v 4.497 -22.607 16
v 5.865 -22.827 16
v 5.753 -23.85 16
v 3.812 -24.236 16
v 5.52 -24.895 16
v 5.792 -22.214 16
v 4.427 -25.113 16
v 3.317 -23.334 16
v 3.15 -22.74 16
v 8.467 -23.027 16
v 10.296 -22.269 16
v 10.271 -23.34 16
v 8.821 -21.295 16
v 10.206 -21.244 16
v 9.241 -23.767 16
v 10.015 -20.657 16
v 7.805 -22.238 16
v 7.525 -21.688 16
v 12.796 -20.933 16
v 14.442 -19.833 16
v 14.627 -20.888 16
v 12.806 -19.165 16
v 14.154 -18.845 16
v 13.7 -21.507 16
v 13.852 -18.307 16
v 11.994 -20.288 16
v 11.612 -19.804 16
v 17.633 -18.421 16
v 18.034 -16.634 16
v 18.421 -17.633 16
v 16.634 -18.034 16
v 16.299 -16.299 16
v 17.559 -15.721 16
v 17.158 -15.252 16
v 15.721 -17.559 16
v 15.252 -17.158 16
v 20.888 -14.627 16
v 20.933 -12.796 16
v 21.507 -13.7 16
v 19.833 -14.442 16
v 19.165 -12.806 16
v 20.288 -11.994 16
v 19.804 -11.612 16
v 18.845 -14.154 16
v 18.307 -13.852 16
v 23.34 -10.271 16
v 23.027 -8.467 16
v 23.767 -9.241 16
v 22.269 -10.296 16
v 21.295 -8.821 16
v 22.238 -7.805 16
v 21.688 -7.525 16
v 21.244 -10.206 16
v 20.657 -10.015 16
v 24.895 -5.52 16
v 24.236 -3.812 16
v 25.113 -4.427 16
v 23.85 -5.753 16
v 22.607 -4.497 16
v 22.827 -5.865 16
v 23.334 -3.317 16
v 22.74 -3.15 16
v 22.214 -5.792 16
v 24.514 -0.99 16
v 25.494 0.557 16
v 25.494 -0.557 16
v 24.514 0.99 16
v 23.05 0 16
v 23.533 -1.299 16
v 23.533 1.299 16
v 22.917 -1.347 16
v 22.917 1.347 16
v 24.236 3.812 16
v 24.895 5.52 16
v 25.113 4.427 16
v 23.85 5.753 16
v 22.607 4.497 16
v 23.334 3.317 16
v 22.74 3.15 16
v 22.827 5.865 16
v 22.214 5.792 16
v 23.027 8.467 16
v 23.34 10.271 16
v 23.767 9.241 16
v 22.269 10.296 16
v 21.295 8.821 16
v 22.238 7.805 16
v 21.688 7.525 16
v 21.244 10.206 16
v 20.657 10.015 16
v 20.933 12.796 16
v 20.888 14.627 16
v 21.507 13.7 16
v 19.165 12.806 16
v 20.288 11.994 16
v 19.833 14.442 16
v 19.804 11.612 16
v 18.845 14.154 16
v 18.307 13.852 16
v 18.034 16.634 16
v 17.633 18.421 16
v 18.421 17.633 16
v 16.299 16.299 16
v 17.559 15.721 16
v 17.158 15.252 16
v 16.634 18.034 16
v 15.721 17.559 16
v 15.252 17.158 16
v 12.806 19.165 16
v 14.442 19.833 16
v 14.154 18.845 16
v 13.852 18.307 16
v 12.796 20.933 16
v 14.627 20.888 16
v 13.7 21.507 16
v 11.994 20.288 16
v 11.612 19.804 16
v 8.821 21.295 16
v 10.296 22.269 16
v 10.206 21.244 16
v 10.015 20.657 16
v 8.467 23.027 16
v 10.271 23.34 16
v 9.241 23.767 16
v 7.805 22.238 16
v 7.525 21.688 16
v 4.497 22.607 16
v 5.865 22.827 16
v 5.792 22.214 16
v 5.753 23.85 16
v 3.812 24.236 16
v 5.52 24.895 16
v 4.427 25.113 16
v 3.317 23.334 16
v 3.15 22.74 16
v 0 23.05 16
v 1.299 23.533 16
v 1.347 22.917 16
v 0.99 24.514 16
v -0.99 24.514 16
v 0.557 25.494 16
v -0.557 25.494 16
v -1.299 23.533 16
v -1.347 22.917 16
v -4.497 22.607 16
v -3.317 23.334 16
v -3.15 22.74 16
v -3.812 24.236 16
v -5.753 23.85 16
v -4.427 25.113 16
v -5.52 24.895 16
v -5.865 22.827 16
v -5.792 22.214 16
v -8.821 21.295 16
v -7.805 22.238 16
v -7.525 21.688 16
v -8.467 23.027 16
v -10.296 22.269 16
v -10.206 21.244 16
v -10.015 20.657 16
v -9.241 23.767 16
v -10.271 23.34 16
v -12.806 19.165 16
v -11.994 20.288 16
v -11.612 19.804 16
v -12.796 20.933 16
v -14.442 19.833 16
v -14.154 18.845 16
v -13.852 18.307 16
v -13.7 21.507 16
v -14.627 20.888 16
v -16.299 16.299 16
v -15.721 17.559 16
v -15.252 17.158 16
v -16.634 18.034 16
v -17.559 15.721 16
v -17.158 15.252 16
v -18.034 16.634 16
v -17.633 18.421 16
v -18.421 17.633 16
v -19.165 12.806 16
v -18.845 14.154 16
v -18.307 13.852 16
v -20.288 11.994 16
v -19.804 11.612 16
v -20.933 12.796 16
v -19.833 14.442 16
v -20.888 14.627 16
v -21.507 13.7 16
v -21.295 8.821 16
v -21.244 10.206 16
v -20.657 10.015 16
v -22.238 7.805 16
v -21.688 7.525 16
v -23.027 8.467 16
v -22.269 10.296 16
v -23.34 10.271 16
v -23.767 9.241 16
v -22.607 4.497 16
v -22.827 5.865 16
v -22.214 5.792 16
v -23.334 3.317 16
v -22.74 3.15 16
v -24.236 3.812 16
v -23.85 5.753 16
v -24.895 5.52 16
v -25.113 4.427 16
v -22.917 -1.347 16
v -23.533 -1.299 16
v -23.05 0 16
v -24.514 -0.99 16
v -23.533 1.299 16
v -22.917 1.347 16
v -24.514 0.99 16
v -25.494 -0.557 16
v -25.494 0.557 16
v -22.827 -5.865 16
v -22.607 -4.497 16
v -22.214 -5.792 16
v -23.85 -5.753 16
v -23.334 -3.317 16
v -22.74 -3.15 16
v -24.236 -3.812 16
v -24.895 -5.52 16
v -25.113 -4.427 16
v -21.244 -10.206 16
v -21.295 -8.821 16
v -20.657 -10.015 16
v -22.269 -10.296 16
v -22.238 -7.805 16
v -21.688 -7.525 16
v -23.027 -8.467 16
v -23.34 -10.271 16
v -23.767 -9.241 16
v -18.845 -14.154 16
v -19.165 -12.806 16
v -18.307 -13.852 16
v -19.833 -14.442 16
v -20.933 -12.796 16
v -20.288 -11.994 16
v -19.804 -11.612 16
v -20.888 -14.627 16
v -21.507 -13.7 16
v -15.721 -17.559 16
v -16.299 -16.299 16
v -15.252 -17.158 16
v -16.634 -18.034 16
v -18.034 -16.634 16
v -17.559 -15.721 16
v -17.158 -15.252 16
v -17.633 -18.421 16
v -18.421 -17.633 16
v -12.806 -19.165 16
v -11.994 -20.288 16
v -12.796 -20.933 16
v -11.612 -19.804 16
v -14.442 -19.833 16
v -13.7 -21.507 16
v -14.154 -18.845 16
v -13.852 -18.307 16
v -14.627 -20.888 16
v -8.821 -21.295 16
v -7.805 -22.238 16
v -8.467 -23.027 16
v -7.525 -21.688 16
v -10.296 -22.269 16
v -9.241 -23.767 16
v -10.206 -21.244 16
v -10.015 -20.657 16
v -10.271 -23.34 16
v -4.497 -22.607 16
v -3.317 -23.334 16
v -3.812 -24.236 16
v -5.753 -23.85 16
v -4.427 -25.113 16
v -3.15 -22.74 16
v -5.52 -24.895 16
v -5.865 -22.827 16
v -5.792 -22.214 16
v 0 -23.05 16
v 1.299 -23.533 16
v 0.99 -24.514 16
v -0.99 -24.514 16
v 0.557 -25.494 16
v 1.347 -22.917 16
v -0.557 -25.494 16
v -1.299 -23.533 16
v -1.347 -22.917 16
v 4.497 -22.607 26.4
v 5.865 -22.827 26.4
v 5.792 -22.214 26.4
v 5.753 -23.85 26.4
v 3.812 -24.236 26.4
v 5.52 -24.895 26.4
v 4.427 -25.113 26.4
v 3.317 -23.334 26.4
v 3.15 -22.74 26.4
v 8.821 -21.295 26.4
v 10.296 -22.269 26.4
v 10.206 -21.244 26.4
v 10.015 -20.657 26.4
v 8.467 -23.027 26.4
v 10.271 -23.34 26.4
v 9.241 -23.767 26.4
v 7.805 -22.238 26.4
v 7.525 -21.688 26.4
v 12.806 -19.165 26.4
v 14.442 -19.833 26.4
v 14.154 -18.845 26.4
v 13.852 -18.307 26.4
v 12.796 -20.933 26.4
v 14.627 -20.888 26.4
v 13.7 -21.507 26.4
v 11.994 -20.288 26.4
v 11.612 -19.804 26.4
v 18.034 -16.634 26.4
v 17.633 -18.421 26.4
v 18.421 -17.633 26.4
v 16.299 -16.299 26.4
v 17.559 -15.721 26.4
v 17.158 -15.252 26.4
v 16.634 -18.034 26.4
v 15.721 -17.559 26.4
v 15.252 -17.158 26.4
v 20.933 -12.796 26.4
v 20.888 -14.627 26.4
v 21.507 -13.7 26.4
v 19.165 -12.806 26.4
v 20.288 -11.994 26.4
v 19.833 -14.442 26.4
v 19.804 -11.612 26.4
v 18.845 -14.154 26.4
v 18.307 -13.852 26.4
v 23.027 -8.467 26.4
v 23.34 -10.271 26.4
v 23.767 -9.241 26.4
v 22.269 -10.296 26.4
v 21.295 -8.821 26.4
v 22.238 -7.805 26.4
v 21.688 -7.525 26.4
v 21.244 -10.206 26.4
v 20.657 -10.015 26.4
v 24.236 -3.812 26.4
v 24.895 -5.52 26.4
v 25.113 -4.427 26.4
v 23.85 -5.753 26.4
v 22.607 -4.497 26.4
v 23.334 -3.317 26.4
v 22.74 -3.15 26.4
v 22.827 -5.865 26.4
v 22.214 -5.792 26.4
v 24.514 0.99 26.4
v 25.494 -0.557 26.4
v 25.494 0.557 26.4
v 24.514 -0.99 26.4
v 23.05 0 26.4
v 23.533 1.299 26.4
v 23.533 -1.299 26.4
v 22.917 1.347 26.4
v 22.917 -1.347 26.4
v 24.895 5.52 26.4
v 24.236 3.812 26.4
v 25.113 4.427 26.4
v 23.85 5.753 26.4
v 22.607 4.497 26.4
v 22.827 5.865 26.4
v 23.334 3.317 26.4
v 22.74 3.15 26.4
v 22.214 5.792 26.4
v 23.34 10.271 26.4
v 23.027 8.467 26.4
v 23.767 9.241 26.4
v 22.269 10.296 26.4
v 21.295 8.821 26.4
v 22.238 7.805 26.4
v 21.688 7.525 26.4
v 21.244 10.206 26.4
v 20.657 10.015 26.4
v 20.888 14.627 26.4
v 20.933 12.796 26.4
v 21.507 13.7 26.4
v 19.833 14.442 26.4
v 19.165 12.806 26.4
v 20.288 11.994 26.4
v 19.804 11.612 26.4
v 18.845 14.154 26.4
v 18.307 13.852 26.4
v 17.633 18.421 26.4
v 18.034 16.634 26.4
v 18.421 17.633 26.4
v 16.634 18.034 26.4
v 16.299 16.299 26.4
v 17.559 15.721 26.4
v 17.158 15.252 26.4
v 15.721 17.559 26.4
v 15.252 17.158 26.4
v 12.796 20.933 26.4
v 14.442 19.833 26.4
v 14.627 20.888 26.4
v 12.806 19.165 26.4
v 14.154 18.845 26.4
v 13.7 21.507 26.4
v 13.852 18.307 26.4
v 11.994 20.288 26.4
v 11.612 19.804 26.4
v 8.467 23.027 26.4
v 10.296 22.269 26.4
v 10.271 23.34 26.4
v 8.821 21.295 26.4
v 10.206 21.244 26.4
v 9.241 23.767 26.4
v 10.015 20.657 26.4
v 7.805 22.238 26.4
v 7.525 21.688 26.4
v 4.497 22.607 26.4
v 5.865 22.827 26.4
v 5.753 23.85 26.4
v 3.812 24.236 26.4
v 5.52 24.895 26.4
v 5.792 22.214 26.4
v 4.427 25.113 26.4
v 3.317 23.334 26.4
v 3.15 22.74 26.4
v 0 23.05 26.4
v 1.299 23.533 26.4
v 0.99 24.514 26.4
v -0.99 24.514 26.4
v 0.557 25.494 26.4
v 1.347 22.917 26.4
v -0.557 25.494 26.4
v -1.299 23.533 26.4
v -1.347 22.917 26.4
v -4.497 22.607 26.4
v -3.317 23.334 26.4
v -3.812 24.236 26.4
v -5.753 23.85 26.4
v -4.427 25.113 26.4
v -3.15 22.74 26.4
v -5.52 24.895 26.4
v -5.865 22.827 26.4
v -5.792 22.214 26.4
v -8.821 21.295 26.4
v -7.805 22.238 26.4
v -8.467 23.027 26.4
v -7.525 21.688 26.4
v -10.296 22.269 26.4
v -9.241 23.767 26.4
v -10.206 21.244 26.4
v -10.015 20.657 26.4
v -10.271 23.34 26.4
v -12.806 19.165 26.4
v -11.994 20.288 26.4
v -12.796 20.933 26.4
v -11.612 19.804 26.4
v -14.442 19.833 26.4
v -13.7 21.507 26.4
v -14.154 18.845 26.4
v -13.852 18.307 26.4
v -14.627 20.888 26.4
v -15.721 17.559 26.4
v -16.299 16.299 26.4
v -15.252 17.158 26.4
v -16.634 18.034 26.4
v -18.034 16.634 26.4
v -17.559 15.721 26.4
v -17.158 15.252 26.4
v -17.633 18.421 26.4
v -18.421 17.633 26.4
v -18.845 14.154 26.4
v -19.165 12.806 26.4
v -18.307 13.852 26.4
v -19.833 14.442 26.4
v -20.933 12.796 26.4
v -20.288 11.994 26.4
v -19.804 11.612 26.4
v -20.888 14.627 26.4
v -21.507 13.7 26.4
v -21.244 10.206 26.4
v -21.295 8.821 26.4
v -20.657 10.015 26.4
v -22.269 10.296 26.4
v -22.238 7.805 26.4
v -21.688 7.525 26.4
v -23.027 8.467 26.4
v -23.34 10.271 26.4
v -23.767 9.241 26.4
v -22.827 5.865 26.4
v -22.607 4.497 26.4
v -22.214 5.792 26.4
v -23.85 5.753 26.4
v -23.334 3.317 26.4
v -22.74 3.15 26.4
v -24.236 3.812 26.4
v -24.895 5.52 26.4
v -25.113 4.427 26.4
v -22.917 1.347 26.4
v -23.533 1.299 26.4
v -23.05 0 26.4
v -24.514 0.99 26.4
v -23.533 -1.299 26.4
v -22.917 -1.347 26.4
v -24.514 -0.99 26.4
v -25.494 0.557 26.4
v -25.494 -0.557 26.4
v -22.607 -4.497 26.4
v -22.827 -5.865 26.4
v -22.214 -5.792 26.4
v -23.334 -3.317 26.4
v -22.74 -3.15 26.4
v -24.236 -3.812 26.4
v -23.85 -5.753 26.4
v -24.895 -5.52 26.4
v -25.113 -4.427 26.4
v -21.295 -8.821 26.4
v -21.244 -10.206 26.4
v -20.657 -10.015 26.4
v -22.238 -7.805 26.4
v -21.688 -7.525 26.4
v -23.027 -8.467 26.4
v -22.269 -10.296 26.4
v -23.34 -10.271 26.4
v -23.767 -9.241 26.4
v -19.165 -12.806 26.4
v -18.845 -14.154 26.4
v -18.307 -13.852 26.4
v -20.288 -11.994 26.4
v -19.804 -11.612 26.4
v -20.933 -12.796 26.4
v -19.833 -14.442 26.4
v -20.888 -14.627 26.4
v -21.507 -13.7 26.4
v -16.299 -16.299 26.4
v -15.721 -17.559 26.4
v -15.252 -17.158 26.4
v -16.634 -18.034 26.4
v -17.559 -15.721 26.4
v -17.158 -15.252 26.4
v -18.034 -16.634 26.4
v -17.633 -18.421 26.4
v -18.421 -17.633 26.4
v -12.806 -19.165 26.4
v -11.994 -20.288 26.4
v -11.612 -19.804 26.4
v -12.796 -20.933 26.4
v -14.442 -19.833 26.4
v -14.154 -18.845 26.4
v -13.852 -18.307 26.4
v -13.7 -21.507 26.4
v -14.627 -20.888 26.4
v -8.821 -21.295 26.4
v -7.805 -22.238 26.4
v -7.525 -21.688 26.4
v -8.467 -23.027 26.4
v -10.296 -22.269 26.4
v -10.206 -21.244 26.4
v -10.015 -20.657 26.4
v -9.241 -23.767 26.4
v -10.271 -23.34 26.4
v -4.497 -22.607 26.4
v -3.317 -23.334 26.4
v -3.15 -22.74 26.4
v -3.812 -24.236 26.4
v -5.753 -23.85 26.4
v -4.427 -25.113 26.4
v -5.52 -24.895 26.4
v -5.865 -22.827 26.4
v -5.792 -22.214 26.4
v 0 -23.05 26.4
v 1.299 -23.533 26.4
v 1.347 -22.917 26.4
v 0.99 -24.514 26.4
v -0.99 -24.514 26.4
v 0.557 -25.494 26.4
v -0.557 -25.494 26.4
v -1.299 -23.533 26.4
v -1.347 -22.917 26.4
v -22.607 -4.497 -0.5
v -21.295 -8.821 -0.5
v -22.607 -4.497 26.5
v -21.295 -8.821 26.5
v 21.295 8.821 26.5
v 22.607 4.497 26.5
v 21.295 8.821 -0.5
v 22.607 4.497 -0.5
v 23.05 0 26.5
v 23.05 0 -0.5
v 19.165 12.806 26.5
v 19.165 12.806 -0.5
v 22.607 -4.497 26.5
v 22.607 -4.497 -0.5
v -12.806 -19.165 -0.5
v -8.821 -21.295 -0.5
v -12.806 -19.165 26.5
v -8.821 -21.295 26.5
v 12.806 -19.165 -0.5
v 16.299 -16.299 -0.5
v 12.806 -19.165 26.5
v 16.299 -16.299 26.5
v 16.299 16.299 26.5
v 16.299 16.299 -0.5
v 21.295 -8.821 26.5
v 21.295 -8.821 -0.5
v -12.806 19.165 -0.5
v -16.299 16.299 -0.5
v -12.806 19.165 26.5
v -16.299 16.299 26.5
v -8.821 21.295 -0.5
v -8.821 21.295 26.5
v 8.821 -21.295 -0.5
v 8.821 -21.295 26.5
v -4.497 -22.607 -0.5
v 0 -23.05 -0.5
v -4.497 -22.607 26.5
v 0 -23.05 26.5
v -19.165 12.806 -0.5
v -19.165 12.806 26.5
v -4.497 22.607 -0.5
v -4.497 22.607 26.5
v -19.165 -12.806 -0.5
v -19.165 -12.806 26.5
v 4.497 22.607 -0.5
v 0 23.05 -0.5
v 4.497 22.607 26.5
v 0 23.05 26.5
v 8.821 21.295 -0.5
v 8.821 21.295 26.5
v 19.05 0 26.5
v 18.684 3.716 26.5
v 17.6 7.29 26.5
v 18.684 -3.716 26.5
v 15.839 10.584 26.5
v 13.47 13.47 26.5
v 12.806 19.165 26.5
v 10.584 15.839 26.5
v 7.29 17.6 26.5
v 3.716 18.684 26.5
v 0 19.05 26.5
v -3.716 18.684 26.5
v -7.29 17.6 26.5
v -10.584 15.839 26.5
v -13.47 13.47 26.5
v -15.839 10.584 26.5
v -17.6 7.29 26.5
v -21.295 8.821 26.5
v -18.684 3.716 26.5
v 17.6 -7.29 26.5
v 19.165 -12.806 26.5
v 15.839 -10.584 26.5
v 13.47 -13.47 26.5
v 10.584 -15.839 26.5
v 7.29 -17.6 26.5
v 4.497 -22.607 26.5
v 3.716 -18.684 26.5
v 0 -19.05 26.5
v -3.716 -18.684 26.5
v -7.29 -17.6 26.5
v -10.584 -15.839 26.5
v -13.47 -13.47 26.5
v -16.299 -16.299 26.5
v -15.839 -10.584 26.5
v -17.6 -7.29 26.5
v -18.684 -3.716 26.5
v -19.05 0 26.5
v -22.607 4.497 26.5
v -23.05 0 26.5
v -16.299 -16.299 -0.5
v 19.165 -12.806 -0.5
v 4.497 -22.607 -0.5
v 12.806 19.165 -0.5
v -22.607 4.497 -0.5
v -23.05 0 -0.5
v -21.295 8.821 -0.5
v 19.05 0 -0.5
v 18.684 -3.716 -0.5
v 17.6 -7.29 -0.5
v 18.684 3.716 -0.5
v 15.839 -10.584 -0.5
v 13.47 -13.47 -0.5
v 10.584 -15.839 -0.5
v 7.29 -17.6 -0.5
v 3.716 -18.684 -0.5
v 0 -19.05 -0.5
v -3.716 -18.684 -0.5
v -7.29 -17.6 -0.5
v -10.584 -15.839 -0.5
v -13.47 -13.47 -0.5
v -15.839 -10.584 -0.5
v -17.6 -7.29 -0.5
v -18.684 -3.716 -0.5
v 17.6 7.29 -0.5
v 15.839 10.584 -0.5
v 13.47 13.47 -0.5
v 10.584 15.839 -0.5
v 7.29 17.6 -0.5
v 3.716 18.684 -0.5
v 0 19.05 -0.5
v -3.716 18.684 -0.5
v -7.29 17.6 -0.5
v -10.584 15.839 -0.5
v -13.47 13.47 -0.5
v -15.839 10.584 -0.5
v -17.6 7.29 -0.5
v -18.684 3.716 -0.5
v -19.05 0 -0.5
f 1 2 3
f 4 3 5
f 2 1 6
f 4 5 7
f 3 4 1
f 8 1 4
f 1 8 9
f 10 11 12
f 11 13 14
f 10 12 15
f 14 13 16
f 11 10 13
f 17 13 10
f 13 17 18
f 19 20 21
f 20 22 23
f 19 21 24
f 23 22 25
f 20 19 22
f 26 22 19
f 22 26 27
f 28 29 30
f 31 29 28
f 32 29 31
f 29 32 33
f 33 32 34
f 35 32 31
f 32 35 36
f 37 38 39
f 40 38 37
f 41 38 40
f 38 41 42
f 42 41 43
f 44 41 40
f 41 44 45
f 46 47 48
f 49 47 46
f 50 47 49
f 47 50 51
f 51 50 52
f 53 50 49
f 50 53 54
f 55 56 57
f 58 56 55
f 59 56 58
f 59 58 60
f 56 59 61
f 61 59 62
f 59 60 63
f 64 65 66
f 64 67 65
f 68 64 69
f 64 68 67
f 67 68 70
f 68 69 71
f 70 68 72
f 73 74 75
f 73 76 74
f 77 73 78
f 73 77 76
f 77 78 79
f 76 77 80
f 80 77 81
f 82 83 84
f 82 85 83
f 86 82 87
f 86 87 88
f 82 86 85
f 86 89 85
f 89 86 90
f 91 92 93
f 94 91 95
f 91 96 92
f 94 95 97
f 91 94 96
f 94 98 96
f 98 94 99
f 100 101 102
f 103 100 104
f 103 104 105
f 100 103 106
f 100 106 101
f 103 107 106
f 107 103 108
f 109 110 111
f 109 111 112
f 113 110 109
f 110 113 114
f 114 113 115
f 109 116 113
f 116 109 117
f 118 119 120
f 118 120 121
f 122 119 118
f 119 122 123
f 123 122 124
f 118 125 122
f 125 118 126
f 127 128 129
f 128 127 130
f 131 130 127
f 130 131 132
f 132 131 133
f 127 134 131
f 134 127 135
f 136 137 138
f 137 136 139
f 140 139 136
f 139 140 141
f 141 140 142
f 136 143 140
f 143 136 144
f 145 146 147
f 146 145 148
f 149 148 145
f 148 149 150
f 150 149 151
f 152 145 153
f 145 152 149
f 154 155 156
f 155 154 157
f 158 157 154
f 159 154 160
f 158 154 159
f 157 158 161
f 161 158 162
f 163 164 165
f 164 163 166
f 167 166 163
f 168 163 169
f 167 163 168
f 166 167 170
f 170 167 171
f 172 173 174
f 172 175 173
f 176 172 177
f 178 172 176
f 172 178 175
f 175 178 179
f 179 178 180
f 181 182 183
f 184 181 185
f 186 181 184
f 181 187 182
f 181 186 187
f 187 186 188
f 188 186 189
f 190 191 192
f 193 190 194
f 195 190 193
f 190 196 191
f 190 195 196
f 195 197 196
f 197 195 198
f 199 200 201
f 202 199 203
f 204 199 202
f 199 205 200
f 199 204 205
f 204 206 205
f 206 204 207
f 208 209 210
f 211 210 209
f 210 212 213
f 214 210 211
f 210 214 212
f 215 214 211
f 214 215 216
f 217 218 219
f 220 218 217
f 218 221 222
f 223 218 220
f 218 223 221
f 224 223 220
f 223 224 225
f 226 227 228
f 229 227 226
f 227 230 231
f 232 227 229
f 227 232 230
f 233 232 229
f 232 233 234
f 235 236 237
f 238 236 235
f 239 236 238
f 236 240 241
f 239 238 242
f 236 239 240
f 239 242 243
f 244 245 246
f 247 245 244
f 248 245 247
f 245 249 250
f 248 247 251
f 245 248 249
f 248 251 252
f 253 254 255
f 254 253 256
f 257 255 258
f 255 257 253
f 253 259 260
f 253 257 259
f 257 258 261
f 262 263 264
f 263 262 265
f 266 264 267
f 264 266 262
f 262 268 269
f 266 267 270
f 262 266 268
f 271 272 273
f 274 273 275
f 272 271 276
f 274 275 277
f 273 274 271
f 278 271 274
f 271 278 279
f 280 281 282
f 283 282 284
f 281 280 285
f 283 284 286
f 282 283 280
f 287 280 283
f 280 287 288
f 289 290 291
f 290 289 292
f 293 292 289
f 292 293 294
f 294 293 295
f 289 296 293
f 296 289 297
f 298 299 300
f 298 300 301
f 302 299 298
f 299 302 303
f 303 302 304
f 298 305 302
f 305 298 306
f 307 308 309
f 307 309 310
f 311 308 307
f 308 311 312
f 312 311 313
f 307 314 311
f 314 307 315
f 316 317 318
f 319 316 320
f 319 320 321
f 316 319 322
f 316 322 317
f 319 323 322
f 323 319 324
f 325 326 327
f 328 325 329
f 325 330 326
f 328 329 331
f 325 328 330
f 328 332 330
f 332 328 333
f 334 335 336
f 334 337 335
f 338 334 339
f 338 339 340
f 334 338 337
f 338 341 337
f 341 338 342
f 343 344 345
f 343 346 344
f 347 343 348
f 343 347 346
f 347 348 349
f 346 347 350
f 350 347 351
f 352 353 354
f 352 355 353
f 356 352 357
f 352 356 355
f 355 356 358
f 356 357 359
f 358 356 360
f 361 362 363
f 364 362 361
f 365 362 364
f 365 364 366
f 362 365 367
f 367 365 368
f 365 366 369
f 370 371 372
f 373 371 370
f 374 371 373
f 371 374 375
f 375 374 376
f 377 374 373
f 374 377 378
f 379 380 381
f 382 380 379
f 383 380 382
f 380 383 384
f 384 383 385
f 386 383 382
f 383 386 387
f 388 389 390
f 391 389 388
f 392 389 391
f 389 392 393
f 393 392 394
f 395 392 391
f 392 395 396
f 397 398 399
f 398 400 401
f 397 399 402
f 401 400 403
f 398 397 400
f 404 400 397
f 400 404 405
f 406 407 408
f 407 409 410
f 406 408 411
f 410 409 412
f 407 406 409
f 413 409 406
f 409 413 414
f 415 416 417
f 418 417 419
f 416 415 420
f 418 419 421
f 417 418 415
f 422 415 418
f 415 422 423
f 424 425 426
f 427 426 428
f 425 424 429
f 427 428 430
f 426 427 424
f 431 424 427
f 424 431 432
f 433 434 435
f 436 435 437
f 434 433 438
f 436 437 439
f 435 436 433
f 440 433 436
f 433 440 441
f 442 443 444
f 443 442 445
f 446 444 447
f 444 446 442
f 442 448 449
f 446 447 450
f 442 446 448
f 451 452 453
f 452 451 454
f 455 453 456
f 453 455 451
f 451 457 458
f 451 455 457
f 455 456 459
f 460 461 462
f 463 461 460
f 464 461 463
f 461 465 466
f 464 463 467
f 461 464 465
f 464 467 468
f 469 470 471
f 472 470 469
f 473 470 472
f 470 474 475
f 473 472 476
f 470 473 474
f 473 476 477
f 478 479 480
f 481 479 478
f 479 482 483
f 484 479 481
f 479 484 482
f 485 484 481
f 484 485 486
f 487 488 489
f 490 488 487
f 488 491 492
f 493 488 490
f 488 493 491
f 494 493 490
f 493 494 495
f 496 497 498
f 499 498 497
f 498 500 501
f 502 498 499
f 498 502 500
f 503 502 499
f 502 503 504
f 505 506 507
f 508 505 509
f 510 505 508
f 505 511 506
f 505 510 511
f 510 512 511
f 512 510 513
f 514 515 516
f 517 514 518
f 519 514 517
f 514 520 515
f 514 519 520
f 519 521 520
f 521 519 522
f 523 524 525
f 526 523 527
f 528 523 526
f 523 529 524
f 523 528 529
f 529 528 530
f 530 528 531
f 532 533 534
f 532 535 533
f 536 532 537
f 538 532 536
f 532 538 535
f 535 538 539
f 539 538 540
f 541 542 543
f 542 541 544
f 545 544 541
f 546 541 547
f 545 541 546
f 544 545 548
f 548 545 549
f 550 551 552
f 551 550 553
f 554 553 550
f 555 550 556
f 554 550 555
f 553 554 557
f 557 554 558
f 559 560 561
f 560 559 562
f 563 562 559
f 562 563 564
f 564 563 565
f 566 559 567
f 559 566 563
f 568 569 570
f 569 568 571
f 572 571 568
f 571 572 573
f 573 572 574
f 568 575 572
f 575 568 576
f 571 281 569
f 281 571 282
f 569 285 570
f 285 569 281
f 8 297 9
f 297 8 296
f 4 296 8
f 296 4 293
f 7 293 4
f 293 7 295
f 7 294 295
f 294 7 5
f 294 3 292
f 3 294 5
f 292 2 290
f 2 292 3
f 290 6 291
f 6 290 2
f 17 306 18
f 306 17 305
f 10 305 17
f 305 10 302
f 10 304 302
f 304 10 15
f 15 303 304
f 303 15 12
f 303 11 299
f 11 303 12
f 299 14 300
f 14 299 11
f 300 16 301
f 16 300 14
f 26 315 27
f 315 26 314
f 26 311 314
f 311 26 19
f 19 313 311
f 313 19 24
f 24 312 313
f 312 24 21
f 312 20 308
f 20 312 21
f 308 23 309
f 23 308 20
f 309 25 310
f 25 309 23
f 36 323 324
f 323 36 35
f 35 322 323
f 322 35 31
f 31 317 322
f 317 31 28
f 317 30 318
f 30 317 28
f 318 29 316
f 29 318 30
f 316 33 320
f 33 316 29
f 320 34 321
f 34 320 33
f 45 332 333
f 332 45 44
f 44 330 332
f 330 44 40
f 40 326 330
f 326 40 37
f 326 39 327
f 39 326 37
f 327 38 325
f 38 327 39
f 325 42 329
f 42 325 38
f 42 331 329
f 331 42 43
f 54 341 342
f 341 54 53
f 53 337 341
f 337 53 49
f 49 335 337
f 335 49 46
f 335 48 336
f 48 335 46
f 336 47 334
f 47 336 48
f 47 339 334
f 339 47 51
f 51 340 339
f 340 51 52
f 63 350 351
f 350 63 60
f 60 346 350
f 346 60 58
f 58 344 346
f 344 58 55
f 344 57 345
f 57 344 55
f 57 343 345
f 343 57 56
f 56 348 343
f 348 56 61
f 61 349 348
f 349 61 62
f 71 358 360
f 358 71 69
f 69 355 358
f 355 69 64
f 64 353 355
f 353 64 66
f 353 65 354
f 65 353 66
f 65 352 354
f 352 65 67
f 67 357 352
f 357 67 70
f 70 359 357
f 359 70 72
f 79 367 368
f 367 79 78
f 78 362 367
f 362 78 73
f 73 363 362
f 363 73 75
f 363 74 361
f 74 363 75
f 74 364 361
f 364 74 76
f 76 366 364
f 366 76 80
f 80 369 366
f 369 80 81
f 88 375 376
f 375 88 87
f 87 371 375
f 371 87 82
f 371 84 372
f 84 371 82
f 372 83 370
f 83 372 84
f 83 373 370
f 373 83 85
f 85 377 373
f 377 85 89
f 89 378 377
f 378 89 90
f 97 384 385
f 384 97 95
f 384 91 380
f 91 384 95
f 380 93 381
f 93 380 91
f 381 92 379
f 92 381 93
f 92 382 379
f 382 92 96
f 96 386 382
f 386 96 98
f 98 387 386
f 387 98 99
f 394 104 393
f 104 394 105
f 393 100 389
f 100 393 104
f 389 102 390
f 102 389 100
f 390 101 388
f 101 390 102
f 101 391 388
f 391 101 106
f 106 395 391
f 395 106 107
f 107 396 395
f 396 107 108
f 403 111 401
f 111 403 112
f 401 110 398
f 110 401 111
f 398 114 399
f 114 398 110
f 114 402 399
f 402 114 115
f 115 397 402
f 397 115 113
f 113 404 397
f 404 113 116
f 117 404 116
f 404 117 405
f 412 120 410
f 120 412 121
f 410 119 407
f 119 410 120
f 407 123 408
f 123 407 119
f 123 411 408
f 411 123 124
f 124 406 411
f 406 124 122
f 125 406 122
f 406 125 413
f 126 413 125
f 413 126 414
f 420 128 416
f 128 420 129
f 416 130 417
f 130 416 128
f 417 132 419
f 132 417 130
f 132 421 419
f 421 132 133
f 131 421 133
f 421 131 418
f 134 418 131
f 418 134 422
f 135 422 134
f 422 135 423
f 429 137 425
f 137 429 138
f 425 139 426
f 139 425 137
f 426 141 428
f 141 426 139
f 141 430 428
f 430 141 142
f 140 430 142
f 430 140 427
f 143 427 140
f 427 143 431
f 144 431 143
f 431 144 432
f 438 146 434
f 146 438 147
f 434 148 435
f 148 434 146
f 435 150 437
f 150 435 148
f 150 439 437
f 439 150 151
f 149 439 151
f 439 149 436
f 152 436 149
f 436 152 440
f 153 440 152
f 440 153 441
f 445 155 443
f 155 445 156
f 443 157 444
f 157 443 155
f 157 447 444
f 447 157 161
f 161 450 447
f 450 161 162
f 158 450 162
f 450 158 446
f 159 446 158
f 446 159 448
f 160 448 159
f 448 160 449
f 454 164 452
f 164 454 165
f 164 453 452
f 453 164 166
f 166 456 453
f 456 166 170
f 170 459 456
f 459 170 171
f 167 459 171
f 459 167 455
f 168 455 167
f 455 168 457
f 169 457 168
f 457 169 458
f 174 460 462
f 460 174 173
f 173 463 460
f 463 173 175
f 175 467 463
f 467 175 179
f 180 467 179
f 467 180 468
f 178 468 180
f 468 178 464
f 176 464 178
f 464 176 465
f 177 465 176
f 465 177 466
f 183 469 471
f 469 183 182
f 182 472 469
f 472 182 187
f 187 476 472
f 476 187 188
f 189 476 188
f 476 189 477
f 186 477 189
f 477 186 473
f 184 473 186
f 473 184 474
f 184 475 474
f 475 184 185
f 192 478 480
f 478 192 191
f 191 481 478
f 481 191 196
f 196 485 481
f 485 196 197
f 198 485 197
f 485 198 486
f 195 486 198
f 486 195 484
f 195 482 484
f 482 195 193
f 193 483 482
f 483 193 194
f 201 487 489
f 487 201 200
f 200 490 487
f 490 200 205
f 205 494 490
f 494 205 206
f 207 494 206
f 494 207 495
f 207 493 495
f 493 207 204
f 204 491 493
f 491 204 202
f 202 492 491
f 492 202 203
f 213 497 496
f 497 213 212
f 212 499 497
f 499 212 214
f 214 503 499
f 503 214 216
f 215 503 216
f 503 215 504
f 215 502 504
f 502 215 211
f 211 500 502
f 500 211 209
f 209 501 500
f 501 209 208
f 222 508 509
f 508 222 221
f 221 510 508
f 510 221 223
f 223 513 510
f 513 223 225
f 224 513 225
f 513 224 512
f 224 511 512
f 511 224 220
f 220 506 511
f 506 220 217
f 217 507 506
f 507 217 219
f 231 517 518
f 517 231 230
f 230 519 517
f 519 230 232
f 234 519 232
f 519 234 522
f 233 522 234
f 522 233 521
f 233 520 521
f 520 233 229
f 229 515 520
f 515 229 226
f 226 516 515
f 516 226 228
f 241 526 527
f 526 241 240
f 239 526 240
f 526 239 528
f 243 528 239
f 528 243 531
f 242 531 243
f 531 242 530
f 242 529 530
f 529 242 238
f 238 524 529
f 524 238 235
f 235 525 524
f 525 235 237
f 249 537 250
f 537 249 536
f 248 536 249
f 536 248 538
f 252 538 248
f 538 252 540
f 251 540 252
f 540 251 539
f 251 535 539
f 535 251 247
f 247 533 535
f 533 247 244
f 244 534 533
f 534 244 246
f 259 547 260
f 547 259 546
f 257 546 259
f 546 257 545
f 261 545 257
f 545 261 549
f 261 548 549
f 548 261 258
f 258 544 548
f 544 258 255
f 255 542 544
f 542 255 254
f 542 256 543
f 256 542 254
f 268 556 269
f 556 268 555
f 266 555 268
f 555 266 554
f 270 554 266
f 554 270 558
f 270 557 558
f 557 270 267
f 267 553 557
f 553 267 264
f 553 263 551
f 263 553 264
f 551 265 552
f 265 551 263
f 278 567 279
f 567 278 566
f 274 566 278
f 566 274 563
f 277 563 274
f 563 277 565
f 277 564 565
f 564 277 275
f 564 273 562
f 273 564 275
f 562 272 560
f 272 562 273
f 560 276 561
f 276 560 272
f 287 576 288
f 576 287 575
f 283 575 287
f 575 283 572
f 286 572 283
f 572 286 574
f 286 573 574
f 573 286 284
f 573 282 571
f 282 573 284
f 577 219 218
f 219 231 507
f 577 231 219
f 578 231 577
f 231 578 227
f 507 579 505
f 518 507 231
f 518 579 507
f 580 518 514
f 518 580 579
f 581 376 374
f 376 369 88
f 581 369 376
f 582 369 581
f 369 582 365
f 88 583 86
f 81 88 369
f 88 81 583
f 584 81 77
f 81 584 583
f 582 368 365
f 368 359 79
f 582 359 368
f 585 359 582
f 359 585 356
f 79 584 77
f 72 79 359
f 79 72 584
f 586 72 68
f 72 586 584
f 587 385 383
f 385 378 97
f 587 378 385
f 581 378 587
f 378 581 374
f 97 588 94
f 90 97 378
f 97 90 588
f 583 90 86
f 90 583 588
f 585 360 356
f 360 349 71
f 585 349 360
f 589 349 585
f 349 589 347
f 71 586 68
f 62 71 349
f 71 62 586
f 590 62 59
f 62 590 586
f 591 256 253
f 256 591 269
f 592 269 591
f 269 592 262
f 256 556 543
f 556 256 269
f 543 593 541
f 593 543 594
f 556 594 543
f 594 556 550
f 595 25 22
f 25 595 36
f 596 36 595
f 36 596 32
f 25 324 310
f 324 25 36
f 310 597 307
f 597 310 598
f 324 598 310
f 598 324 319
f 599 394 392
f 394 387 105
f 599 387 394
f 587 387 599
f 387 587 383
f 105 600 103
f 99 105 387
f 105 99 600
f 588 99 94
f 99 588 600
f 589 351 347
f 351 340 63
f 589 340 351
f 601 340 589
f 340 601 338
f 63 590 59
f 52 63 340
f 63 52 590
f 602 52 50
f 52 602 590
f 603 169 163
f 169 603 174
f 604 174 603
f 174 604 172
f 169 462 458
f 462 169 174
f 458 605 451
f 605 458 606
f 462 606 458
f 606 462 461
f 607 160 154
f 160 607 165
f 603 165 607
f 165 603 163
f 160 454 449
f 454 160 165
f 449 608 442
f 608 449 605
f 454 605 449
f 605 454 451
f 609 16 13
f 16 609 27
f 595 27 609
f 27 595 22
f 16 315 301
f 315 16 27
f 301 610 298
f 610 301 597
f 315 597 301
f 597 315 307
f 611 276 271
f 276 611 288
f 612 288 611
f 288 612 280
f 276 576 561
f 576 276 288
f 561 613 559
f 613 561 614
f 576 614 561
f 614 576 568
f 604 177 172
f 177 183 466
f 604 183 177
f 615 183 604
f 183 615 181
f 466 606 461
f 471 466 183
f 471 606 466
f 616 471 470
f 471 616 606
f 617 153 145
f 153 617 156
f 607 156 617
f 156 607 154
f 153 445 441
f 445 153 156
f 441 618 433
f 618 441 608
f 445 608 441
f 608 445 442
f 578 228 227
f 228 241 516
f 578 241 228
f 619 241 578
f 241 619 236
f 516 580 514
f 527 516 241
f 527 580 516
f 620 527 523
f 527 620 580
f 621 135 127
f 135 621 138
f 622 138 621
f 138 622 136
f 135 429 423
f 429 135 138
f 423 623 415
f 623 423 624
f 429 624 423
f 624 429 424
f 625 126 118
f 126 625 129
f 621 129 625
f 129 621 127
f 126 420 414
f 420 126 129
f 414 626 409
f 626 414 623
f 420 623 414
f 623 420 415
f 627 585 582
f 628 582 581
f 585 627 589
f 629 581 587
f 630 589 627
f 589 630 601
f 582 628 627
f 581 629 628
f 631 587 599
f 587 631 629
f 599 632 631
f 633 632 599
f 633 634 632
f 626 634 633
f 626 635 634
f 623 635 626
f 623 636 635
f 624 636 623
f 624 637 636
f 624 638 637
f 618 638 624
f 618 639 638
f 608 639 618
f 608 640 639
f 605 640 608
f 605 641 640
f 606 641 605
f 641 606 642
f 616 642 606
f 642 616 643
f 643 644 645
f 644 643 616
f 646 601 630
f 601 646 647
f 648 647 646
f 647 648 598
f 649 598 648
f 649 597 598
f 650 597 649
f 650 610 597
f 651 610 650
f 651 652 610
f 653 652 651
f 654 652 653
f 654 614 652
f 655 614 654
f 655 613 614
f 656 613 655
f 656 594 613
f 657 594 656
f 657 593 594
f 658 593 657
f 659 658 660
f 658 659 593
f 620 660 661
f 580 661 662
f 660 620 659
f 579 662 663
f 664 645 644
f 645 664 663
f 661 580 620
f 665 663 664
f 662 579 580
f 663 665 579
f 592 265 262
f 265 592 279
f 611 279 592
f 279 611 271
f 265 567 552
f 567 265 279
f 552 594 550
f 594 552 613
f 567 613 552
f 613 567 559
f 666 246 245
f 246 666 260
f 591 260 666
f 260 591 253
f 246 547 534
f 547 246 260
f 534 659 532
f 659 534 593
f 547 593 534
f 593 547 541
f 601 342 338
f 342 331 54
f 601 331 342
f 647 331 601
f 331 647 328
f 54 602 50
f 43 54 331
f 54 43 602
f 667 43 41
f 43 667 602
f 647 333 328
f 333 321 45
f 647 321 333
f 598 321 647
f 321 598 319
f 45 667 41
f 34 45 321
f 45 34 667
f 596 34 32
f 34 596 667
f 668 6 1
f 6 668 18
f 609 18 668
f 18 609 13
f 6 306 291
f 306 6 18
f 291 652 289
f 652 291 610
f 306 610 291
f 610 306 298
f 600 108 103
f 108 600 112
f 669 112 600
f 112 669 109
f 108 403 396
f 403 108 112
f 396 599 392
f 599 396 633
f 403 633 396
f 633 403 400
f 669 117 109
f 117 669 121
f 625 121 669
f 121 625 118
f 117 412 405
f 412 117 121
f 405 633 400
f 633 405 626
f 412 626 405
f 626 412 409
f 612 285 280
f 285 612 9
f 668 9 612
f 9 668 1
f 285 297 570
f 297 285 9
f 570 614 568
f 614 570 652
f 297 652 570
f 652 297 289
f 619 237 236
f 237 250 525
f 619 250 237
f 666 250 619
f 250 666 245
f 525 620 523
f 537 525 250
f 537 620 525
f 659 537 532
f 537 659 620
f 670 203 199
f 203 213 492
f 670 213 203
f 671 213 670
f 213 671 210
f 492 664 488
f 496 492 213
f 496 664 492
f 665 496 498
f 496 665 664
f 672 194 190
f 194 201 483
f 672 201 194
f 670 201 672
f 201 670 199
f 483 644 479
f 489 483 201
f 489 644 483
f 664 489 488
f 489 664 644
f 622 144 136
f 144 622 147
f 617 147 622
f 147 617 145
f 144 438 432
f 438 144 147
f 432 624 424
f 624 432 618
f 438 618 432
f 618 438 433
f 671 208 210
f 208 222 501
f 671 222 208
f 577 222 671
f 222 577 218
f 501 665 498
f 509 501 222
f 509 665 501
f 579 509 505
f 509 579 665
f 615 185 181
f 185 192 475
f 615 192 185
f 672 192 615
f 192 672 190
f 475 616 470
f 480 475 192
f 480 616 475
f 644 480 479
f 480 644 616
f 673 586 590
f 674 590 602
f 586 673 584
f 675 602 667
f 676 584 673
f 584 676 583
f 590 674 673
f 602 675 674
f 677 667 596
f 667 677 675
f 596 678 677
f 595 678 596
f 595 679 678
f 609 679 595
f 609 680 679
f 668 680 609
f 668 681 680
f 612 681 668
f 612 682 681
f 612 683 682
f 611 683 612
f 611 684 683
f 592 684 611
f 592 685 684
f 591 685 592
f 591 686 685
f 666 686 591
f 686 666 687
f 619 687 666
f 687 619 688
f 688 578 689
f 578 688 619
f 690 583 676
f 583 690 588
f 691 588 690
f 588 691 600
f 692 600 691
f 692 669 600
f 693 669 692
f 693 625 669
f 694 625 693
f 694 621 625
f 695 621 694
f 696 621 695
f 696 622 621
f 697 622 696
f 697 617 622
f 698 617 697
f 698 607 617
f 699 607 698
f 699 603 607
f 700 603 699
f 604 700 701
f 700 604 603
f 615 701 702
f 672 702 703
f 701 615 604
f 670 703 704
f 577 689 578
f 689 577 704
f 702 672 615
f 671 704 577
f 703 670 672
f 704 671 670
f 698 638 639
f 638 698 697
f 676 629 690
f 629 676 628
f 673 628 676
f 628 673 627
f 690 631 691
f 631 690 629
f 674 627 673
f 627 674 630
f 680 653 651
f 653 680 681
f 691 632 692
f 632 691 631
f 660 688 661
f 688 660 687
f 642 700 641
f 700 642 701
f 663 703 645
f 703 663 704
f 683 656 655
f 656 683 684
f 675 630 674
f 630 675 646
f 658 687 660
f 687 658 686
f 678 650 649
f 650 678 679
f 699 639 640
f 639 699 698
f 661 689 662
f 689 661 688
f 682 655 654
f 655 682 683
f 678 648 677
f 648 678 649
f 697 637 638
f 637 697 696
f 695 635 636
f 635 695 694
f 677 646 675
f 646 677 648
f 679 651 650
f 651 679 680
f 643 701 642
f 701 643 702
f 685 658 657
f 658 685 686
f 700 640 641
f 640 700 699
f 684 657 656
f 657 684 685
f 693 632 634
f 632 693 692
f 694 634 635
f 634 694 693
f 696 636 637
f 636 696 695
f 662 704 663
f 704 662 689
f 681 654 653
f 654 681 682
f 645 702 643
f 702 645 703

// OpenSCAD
$fn = 32;

// ----------------------------------------------------------------------
// Two-module gear rim: z20 m2 and z32 m1.5, 26 mm wide
// ----------------------------------------------------------------------

// --- parameters (mm) ---
module_a = 2;             // first tooth module
teeth_a = 20;             // first band tooth count
module_b = 1.5;           // second tooth module
teeth_b = 32;             // second band tooth count
band_h = 10;              // height of one tooth band
web_t = 6;                // web thickness between the bands
total = 26;               // overall width over both bands
root_r = 17.5;            // root radius of the coarse band
hub_r = 23.05;            // hub radius
bore_d = 38.1;            // hub bore
hole_count = 6;           // lightening holes
hole_r = 12.25;           // lightening hole circle radius
hole_d = 4.73;            // lightening hole diameter

band_a = [[17.424, -1.631], [19.832, -1.598], [20.912, -1.227], [21.989, -0.695], [21.989, 0.695], [20.912, 1.227], [19.832, 1.598], [17.424, 1.631], [17.075, 3.833], [19.355, 4.609], [20.268, 5.295], [21.128, 6.134], [20.698, 7.456], [19.509, 7.629], [18.367, 7.648], [16.067, 6.935], [15.055, 8.922], [16.983, 10.364], [17.639, 11.299], [18.198, 12.363], [17.381, 13.487], [16.197, 13.284], [15.105, 12.949], [13.138, 11.561], [11.561, 13.138], [12.949, 15.105], [13.284, 16.197], [13.487, 17.381], [12.363, 18.198], [11.299, 17.639], [10.364, 16.983], [8.922, 15.055], [6.935, 16.067], [7.648, 18.367], [7.629, 19.509], [7.456, 20.698], [6.134, 21.128], [5.295, 20.268], [4.609, 19.355], [3.833, 17.075], [1.631, 17.424], [1.598, 19.832], [1.227, 20.912], [0.695, 21.989], [-0.695, 21.989], [-1.227, 20.912], [-1.598, 19.832], [-1.631, 17.424], [-3.833, 17.075], [-4.609, 19.355], [-5.295, 20.268], [-6.134, 21.128], [-7.456, 20.698], [-7.629, 19.509], [-7.648, 18.367], [-6.935, 16.067], [-8.922, 15.055], [-10.364, 16.983], [-11.299, 17.639], [-12.363, 18.198], [-13.487, 17.381], [-13.284, 16.197], [-12.949, 15.105], [-11.561, 13.138], [-13.138, 11.561], [-15.105, 12.949], [-16.197, 13.284], [-17.381, 13.487], [-18.198, 12.363], [-17.639, 11.299], [-16.983, 10.364], [-15.055, 8.922], [-16.067, 6.935], [-18.367, 7.648], [-19.509, 7.629], [-20.698, 7.456], [-21.128, 6.134], [-20.268, 5.295], [-19.355, 4.609], [-17.075, 3.833], [-17.424, 1.631], [-19.832, 1.598], [-20.912, 1.227], [-21.989, 0.695], [-21.989, -0.695], [-20.912, -1.227], [-19.832, -1.598], [-17.424, -1.631], [-17.075, -3.833], [-19.355, -4.609], [-20.268, -5.295], [-21.128, -6.134], [-20.698, -7.456], [-19.509, -7.629], [-18.367, -7.648], [-16.067, -6.935], [-15.055, -8.922], [-16.983, -10.364], [-17.639, -11.299], [-18.198, -12.363], [-17.381, -13.487], [-16.197, -13.284], [-15.105, -12.949], [-13.138, -11.561], [-11.561, -13.138], [-12.949, -15.105], [-13.284, -16.197], [-13.487, -17.381], [-12.363, -18.198], [-11.299, -17.639], [-10.364, -16.983], [-8.922, -15.055], [-6.935, -16.067], [-7.648, -18.367], [-7.629, -19.509], [-7.456, -20.698], [-6.134, -21.128], [-5.295, -20.268], [-4.609, -19.355], [-3.833, -17.075], [-1.631, -17.424], [-1.598, -19.832], [-1.227, -20.912], [-0.695, -21.989], [0.695, -21.989], [1.227, -20.912], [1.598, -19.832], [1.631, -17.424], [3.833, -17.075], [4.609, -19.355], [5.295, -20.268], [6.134, -21.128], [7.456, -20.698], [7.629, -19.509], [7.648, -18.367], [6.935, -16.067], [8.922, -15.055], [10.364, -16.983], [11.299, -17.639], [12.363, -18.198], [13.487, -17.381], [13.284, -16.197], [12.949, -15.105], [11.561, -13.138], [13.138, -11.561], [15.105, -12.949], [16.197, -13.284], [17.381, -13.487], [18.198, -12.363], [17.639, -11.299], [16.983, -10.364], [15.055, -8.922], [16.067, -6.935], [18.367, -7.648], [19.509, -7.629], [20.698, -7.456], [21.128, -6.134], [20.268, -5.295], [19.355, -4.609], [17.075, -3.833]];
band_b = [[22.08, -1.413], [23.533, -1.299], [24.514, -0.99], [25.494, -0.557], [25.494, 0.557], [24.514, 0.99], [23.533, 1.299], [22.08, 1.413], [21.931, 2.922], [23.334, 3.317], [24.236, 3.812], [25.113, 4.427], [24.895, 5.52], [23.85, 5.753], [22.827, 5.865], [21.38, 5.693], [20.94, 7.144], [22.238, 7.805], [23.027, 8.467], [23.767, 9.241], [23.34, 10.271], [22.269, 10.296], [21.244, 10.206], [19.859, 9.755], [19.144, 11.092], [20.288, 11.994], [20.933, 12.796], [21.507, 13.7], [20.888, 14.627], [19.833, 14.442], [18.845, 14.154], [17.574, 13.442], [16.612, 14.614], [17.559, 15.721], [18.034, 16.634], [18.421, 17.633], [17.633, 18.421], [16.634, 18.034], [15.721, 17.559], [14.614, 16.612], [13.442, 17.574], [14.154, 18.845], [14.442, 19.833], [14.627, 20.888], [13.7, 21.507], [12.796, 20.933], [11.994, 20.288], [11.092, 19.144], [9.755, 19.859], [10.206, 21.244], [10.296, 22.269], [10.271, 23.34], [9.241, 23.767], [8.467, 23.027], [7.805, 22.238], [7.144, 20.94], [5.693, 21.38], [5.865, 22.827], [5.753, 23.85], [5.52, 24.895], [4.427, 25.113], [3.812, 24.236], [3.317, 23.334], [2.922, 21.931], [1.413, 22.08], [1.299, 23.533], [0.99, 24.514], [0.557, 25.494], [-0.557, 25.494], [-0.99, 24.514], [-1.299, 23.533], [-1.413, 22.08], [-2.922, 21.931], [-3.317, 23.334], [-3.812, 24.236], [-4.427, 25.113], [-5.52, 24.895], [-5.753, 23.85], [-5.865, 22.827], [-5.693, 21.38], [-7.144, 20.94], [-7.805, 22.238], [-8.467, 23.027], [-9.241, 23.767], [-10.271, 23.34], [-10.296, 22.269], [-10.206, 21.244], [-9.755, 19.859], [-11.092, 19.144], [-11.994, 20.288], [-12.796, 20.933], [-13.7, 21.507], [-14.627, 20.888], [-14.442, 19.833], [-14.154, 18.845], [-13.442, 17.574], [-14.614, 16.612], [-15.721, 17.559], [-16.634, 18.034], [-17.633, 18.421], [-18.421, 17.633], [-18.034, 16.634], [-17.559, 15.721], [-16.612, 14.614], [-17.574, 13.442], [-18.845, 14.154], [-19.833, 14.442], [-20.888, 14.627], [-21.507, 13.7], [-20.933, 12.796], [-20.288, 11.994], [-19.144, 11.092], [-19.859, 9.755], [-21.244, 10.206], [-22.269, 10.296], [-23.34, 10.271], [-23.767, 9.241], [-23.027, 8.467], [-22.238, 7.805], [-20.94, 7.144], [-21.38, 5.693], [-22.827, 5.865], [-23.85, 5.753], [-24.895, 5.52], [-25.113, 4.427], [-24.236, 3.812], [-23.334, 3.317], [-21.931, 2.922], [-22.08, 1.413], [-23.533, 1.299], [-24.514, 0.99], [-25.494, 0.557], [-25.494, -0.557], [-24.514, -0.99], [-23.533, -1.299], [-22.08, -1.413], [-21.931, -2.922], [-23.334, -3.317], [-24.236, -3.812], [-25.113, -4.427], [-24.895, -5.52], [-23.85, -5.753], [-22.827, -5.865], [-21.38, -5.693], [-20.94, -7.144], [-22.238, -7.805], [-23.027, -8.467], [-23.767, -9.241], [-23.34, -10.271], [-22.269, -10.296], [-21.244, -10.206], [-19.859, -9.755], [-19.144, -11.092], [-20.288, -11.994], [-20.933, -12.796], [-21.507, -13.7], [-20.888, -14.627], [-19.833, -14.442], [-18.845, -14.154], [-17.574, -13.442], [-16.612, -14.614], [-17.559, -15.721], [-18.034, -16.634], [-18.421, -17.633], [-17.633, -18.421], [-16.634, -18.034], [-15.721, -17.559], [-14.614, -16.612], [-13.442, -17.574], [-14.154, -18.845], [-14.442, -19.833], [-14.627, -20.888], [-13.7, -21.507], [-12.796, -20.933], [-11.994, -20.288], [-11.092, -19.144], [-9.755, -19.859], [-10.206, -21.244], [-10.296, -22.269], [-10.271, -23.34], [-9.241, -23.767], [-8.467, -23.027], [-7.805, -22.238], [-7.144, -20.94], [-5.693, -21.38], [-5.865, -22.827], [-5.753, -23.85], [-5.52, -24.895], [-4.427, -25.113], [-3.812, -24.236], [-3.317, -23.334], [-2.922, -21.931], [-1.413, -22.08], [-1.299, -23.533], [-0.99, -24.514], [-0.557, -25.494], [0.557, -25.494], [0.99, -24.514], [1.299, -23.533], [1.413, -22.08], [2.922, -21.931], [3.317, -23.334], [3.812, -24.236], [4.427, -25.113], [5.52, -24.895], [5.753, -23.85], [5.865, -22.827], [5.693, -21.38], [7.144, -20.94], [7.805, -22.238], [8.467, -23.027], [9.241, -23.767], [10.271, -23.34], [10.296, -22.269], [10.206, -21.244], [9.755, -19.859], [11.092, -19.144], [11.994, -20.288], [12.796, -20.933], [13.7, -21.507], [14.627, -20.888], [14.442, -19.833], [14.154, -18.845], [13.442, -17.574], [14.614, -16.612], [15.721, -17.559], [16.634, -18.034], [17.633, -18.421], [18.421, -17.633], [18.034, -16.634], [17.559, -15.721], [16.612, -14.614], [17.574, -13.442], [18.845, -14.154], [19.833, -14.442], [20.888, -14.627], [21.507, -13.7], [20.933, -12.796], [20.288, -11.994], [19.144, -11.092], [19.859, -9.755], [21.244, -10.206], [22.269, -10.296], [23.34, -10.271], [23.767, -9.241], [23.027, -8.467], [22.238, -7.805], [20.94, -7.144], [21.38, -5.693], [22.827, -5.865], [23.85, -5.753], [24.895, -5.52], [25.113, -4.427], [24.236, -3.812], [23.334, -3.317], [21.931, -2.922]];

difference() {
  union() {
    /* tooth band A, overlapping the web by 0.4 mm */
    linear_extrude(height = band_h + 0.4) polygon(band_a);
    /* web */
    translate([0, 0, band_h - 0.4]) cylinder(h = web_t + 0.8, d = 2 * root_r);
    /* tooth band B */
    translate([0, 0, band_h + web_t]) linear_extrude(height = band_h + 0.4) polygon(band_b);
    /* hub */
    translate([0, 0, -0.5]) cylinder(h = total + 1.0, d = 2 * hub_r);
  }
  /* bore */
  translate([0, 0, -2.5]) cylinder(h = total + 5, d = bore_d);
  /* lightening holes through the web */
  for (i = [0 : hole_count - 1]) {
    a = i * 360 / hole_count;
    translate([hole_r * cos(a), hole_r * sin(a), -2.5]) cylinder(h = total + 5, d = hole_d);
  }
}
